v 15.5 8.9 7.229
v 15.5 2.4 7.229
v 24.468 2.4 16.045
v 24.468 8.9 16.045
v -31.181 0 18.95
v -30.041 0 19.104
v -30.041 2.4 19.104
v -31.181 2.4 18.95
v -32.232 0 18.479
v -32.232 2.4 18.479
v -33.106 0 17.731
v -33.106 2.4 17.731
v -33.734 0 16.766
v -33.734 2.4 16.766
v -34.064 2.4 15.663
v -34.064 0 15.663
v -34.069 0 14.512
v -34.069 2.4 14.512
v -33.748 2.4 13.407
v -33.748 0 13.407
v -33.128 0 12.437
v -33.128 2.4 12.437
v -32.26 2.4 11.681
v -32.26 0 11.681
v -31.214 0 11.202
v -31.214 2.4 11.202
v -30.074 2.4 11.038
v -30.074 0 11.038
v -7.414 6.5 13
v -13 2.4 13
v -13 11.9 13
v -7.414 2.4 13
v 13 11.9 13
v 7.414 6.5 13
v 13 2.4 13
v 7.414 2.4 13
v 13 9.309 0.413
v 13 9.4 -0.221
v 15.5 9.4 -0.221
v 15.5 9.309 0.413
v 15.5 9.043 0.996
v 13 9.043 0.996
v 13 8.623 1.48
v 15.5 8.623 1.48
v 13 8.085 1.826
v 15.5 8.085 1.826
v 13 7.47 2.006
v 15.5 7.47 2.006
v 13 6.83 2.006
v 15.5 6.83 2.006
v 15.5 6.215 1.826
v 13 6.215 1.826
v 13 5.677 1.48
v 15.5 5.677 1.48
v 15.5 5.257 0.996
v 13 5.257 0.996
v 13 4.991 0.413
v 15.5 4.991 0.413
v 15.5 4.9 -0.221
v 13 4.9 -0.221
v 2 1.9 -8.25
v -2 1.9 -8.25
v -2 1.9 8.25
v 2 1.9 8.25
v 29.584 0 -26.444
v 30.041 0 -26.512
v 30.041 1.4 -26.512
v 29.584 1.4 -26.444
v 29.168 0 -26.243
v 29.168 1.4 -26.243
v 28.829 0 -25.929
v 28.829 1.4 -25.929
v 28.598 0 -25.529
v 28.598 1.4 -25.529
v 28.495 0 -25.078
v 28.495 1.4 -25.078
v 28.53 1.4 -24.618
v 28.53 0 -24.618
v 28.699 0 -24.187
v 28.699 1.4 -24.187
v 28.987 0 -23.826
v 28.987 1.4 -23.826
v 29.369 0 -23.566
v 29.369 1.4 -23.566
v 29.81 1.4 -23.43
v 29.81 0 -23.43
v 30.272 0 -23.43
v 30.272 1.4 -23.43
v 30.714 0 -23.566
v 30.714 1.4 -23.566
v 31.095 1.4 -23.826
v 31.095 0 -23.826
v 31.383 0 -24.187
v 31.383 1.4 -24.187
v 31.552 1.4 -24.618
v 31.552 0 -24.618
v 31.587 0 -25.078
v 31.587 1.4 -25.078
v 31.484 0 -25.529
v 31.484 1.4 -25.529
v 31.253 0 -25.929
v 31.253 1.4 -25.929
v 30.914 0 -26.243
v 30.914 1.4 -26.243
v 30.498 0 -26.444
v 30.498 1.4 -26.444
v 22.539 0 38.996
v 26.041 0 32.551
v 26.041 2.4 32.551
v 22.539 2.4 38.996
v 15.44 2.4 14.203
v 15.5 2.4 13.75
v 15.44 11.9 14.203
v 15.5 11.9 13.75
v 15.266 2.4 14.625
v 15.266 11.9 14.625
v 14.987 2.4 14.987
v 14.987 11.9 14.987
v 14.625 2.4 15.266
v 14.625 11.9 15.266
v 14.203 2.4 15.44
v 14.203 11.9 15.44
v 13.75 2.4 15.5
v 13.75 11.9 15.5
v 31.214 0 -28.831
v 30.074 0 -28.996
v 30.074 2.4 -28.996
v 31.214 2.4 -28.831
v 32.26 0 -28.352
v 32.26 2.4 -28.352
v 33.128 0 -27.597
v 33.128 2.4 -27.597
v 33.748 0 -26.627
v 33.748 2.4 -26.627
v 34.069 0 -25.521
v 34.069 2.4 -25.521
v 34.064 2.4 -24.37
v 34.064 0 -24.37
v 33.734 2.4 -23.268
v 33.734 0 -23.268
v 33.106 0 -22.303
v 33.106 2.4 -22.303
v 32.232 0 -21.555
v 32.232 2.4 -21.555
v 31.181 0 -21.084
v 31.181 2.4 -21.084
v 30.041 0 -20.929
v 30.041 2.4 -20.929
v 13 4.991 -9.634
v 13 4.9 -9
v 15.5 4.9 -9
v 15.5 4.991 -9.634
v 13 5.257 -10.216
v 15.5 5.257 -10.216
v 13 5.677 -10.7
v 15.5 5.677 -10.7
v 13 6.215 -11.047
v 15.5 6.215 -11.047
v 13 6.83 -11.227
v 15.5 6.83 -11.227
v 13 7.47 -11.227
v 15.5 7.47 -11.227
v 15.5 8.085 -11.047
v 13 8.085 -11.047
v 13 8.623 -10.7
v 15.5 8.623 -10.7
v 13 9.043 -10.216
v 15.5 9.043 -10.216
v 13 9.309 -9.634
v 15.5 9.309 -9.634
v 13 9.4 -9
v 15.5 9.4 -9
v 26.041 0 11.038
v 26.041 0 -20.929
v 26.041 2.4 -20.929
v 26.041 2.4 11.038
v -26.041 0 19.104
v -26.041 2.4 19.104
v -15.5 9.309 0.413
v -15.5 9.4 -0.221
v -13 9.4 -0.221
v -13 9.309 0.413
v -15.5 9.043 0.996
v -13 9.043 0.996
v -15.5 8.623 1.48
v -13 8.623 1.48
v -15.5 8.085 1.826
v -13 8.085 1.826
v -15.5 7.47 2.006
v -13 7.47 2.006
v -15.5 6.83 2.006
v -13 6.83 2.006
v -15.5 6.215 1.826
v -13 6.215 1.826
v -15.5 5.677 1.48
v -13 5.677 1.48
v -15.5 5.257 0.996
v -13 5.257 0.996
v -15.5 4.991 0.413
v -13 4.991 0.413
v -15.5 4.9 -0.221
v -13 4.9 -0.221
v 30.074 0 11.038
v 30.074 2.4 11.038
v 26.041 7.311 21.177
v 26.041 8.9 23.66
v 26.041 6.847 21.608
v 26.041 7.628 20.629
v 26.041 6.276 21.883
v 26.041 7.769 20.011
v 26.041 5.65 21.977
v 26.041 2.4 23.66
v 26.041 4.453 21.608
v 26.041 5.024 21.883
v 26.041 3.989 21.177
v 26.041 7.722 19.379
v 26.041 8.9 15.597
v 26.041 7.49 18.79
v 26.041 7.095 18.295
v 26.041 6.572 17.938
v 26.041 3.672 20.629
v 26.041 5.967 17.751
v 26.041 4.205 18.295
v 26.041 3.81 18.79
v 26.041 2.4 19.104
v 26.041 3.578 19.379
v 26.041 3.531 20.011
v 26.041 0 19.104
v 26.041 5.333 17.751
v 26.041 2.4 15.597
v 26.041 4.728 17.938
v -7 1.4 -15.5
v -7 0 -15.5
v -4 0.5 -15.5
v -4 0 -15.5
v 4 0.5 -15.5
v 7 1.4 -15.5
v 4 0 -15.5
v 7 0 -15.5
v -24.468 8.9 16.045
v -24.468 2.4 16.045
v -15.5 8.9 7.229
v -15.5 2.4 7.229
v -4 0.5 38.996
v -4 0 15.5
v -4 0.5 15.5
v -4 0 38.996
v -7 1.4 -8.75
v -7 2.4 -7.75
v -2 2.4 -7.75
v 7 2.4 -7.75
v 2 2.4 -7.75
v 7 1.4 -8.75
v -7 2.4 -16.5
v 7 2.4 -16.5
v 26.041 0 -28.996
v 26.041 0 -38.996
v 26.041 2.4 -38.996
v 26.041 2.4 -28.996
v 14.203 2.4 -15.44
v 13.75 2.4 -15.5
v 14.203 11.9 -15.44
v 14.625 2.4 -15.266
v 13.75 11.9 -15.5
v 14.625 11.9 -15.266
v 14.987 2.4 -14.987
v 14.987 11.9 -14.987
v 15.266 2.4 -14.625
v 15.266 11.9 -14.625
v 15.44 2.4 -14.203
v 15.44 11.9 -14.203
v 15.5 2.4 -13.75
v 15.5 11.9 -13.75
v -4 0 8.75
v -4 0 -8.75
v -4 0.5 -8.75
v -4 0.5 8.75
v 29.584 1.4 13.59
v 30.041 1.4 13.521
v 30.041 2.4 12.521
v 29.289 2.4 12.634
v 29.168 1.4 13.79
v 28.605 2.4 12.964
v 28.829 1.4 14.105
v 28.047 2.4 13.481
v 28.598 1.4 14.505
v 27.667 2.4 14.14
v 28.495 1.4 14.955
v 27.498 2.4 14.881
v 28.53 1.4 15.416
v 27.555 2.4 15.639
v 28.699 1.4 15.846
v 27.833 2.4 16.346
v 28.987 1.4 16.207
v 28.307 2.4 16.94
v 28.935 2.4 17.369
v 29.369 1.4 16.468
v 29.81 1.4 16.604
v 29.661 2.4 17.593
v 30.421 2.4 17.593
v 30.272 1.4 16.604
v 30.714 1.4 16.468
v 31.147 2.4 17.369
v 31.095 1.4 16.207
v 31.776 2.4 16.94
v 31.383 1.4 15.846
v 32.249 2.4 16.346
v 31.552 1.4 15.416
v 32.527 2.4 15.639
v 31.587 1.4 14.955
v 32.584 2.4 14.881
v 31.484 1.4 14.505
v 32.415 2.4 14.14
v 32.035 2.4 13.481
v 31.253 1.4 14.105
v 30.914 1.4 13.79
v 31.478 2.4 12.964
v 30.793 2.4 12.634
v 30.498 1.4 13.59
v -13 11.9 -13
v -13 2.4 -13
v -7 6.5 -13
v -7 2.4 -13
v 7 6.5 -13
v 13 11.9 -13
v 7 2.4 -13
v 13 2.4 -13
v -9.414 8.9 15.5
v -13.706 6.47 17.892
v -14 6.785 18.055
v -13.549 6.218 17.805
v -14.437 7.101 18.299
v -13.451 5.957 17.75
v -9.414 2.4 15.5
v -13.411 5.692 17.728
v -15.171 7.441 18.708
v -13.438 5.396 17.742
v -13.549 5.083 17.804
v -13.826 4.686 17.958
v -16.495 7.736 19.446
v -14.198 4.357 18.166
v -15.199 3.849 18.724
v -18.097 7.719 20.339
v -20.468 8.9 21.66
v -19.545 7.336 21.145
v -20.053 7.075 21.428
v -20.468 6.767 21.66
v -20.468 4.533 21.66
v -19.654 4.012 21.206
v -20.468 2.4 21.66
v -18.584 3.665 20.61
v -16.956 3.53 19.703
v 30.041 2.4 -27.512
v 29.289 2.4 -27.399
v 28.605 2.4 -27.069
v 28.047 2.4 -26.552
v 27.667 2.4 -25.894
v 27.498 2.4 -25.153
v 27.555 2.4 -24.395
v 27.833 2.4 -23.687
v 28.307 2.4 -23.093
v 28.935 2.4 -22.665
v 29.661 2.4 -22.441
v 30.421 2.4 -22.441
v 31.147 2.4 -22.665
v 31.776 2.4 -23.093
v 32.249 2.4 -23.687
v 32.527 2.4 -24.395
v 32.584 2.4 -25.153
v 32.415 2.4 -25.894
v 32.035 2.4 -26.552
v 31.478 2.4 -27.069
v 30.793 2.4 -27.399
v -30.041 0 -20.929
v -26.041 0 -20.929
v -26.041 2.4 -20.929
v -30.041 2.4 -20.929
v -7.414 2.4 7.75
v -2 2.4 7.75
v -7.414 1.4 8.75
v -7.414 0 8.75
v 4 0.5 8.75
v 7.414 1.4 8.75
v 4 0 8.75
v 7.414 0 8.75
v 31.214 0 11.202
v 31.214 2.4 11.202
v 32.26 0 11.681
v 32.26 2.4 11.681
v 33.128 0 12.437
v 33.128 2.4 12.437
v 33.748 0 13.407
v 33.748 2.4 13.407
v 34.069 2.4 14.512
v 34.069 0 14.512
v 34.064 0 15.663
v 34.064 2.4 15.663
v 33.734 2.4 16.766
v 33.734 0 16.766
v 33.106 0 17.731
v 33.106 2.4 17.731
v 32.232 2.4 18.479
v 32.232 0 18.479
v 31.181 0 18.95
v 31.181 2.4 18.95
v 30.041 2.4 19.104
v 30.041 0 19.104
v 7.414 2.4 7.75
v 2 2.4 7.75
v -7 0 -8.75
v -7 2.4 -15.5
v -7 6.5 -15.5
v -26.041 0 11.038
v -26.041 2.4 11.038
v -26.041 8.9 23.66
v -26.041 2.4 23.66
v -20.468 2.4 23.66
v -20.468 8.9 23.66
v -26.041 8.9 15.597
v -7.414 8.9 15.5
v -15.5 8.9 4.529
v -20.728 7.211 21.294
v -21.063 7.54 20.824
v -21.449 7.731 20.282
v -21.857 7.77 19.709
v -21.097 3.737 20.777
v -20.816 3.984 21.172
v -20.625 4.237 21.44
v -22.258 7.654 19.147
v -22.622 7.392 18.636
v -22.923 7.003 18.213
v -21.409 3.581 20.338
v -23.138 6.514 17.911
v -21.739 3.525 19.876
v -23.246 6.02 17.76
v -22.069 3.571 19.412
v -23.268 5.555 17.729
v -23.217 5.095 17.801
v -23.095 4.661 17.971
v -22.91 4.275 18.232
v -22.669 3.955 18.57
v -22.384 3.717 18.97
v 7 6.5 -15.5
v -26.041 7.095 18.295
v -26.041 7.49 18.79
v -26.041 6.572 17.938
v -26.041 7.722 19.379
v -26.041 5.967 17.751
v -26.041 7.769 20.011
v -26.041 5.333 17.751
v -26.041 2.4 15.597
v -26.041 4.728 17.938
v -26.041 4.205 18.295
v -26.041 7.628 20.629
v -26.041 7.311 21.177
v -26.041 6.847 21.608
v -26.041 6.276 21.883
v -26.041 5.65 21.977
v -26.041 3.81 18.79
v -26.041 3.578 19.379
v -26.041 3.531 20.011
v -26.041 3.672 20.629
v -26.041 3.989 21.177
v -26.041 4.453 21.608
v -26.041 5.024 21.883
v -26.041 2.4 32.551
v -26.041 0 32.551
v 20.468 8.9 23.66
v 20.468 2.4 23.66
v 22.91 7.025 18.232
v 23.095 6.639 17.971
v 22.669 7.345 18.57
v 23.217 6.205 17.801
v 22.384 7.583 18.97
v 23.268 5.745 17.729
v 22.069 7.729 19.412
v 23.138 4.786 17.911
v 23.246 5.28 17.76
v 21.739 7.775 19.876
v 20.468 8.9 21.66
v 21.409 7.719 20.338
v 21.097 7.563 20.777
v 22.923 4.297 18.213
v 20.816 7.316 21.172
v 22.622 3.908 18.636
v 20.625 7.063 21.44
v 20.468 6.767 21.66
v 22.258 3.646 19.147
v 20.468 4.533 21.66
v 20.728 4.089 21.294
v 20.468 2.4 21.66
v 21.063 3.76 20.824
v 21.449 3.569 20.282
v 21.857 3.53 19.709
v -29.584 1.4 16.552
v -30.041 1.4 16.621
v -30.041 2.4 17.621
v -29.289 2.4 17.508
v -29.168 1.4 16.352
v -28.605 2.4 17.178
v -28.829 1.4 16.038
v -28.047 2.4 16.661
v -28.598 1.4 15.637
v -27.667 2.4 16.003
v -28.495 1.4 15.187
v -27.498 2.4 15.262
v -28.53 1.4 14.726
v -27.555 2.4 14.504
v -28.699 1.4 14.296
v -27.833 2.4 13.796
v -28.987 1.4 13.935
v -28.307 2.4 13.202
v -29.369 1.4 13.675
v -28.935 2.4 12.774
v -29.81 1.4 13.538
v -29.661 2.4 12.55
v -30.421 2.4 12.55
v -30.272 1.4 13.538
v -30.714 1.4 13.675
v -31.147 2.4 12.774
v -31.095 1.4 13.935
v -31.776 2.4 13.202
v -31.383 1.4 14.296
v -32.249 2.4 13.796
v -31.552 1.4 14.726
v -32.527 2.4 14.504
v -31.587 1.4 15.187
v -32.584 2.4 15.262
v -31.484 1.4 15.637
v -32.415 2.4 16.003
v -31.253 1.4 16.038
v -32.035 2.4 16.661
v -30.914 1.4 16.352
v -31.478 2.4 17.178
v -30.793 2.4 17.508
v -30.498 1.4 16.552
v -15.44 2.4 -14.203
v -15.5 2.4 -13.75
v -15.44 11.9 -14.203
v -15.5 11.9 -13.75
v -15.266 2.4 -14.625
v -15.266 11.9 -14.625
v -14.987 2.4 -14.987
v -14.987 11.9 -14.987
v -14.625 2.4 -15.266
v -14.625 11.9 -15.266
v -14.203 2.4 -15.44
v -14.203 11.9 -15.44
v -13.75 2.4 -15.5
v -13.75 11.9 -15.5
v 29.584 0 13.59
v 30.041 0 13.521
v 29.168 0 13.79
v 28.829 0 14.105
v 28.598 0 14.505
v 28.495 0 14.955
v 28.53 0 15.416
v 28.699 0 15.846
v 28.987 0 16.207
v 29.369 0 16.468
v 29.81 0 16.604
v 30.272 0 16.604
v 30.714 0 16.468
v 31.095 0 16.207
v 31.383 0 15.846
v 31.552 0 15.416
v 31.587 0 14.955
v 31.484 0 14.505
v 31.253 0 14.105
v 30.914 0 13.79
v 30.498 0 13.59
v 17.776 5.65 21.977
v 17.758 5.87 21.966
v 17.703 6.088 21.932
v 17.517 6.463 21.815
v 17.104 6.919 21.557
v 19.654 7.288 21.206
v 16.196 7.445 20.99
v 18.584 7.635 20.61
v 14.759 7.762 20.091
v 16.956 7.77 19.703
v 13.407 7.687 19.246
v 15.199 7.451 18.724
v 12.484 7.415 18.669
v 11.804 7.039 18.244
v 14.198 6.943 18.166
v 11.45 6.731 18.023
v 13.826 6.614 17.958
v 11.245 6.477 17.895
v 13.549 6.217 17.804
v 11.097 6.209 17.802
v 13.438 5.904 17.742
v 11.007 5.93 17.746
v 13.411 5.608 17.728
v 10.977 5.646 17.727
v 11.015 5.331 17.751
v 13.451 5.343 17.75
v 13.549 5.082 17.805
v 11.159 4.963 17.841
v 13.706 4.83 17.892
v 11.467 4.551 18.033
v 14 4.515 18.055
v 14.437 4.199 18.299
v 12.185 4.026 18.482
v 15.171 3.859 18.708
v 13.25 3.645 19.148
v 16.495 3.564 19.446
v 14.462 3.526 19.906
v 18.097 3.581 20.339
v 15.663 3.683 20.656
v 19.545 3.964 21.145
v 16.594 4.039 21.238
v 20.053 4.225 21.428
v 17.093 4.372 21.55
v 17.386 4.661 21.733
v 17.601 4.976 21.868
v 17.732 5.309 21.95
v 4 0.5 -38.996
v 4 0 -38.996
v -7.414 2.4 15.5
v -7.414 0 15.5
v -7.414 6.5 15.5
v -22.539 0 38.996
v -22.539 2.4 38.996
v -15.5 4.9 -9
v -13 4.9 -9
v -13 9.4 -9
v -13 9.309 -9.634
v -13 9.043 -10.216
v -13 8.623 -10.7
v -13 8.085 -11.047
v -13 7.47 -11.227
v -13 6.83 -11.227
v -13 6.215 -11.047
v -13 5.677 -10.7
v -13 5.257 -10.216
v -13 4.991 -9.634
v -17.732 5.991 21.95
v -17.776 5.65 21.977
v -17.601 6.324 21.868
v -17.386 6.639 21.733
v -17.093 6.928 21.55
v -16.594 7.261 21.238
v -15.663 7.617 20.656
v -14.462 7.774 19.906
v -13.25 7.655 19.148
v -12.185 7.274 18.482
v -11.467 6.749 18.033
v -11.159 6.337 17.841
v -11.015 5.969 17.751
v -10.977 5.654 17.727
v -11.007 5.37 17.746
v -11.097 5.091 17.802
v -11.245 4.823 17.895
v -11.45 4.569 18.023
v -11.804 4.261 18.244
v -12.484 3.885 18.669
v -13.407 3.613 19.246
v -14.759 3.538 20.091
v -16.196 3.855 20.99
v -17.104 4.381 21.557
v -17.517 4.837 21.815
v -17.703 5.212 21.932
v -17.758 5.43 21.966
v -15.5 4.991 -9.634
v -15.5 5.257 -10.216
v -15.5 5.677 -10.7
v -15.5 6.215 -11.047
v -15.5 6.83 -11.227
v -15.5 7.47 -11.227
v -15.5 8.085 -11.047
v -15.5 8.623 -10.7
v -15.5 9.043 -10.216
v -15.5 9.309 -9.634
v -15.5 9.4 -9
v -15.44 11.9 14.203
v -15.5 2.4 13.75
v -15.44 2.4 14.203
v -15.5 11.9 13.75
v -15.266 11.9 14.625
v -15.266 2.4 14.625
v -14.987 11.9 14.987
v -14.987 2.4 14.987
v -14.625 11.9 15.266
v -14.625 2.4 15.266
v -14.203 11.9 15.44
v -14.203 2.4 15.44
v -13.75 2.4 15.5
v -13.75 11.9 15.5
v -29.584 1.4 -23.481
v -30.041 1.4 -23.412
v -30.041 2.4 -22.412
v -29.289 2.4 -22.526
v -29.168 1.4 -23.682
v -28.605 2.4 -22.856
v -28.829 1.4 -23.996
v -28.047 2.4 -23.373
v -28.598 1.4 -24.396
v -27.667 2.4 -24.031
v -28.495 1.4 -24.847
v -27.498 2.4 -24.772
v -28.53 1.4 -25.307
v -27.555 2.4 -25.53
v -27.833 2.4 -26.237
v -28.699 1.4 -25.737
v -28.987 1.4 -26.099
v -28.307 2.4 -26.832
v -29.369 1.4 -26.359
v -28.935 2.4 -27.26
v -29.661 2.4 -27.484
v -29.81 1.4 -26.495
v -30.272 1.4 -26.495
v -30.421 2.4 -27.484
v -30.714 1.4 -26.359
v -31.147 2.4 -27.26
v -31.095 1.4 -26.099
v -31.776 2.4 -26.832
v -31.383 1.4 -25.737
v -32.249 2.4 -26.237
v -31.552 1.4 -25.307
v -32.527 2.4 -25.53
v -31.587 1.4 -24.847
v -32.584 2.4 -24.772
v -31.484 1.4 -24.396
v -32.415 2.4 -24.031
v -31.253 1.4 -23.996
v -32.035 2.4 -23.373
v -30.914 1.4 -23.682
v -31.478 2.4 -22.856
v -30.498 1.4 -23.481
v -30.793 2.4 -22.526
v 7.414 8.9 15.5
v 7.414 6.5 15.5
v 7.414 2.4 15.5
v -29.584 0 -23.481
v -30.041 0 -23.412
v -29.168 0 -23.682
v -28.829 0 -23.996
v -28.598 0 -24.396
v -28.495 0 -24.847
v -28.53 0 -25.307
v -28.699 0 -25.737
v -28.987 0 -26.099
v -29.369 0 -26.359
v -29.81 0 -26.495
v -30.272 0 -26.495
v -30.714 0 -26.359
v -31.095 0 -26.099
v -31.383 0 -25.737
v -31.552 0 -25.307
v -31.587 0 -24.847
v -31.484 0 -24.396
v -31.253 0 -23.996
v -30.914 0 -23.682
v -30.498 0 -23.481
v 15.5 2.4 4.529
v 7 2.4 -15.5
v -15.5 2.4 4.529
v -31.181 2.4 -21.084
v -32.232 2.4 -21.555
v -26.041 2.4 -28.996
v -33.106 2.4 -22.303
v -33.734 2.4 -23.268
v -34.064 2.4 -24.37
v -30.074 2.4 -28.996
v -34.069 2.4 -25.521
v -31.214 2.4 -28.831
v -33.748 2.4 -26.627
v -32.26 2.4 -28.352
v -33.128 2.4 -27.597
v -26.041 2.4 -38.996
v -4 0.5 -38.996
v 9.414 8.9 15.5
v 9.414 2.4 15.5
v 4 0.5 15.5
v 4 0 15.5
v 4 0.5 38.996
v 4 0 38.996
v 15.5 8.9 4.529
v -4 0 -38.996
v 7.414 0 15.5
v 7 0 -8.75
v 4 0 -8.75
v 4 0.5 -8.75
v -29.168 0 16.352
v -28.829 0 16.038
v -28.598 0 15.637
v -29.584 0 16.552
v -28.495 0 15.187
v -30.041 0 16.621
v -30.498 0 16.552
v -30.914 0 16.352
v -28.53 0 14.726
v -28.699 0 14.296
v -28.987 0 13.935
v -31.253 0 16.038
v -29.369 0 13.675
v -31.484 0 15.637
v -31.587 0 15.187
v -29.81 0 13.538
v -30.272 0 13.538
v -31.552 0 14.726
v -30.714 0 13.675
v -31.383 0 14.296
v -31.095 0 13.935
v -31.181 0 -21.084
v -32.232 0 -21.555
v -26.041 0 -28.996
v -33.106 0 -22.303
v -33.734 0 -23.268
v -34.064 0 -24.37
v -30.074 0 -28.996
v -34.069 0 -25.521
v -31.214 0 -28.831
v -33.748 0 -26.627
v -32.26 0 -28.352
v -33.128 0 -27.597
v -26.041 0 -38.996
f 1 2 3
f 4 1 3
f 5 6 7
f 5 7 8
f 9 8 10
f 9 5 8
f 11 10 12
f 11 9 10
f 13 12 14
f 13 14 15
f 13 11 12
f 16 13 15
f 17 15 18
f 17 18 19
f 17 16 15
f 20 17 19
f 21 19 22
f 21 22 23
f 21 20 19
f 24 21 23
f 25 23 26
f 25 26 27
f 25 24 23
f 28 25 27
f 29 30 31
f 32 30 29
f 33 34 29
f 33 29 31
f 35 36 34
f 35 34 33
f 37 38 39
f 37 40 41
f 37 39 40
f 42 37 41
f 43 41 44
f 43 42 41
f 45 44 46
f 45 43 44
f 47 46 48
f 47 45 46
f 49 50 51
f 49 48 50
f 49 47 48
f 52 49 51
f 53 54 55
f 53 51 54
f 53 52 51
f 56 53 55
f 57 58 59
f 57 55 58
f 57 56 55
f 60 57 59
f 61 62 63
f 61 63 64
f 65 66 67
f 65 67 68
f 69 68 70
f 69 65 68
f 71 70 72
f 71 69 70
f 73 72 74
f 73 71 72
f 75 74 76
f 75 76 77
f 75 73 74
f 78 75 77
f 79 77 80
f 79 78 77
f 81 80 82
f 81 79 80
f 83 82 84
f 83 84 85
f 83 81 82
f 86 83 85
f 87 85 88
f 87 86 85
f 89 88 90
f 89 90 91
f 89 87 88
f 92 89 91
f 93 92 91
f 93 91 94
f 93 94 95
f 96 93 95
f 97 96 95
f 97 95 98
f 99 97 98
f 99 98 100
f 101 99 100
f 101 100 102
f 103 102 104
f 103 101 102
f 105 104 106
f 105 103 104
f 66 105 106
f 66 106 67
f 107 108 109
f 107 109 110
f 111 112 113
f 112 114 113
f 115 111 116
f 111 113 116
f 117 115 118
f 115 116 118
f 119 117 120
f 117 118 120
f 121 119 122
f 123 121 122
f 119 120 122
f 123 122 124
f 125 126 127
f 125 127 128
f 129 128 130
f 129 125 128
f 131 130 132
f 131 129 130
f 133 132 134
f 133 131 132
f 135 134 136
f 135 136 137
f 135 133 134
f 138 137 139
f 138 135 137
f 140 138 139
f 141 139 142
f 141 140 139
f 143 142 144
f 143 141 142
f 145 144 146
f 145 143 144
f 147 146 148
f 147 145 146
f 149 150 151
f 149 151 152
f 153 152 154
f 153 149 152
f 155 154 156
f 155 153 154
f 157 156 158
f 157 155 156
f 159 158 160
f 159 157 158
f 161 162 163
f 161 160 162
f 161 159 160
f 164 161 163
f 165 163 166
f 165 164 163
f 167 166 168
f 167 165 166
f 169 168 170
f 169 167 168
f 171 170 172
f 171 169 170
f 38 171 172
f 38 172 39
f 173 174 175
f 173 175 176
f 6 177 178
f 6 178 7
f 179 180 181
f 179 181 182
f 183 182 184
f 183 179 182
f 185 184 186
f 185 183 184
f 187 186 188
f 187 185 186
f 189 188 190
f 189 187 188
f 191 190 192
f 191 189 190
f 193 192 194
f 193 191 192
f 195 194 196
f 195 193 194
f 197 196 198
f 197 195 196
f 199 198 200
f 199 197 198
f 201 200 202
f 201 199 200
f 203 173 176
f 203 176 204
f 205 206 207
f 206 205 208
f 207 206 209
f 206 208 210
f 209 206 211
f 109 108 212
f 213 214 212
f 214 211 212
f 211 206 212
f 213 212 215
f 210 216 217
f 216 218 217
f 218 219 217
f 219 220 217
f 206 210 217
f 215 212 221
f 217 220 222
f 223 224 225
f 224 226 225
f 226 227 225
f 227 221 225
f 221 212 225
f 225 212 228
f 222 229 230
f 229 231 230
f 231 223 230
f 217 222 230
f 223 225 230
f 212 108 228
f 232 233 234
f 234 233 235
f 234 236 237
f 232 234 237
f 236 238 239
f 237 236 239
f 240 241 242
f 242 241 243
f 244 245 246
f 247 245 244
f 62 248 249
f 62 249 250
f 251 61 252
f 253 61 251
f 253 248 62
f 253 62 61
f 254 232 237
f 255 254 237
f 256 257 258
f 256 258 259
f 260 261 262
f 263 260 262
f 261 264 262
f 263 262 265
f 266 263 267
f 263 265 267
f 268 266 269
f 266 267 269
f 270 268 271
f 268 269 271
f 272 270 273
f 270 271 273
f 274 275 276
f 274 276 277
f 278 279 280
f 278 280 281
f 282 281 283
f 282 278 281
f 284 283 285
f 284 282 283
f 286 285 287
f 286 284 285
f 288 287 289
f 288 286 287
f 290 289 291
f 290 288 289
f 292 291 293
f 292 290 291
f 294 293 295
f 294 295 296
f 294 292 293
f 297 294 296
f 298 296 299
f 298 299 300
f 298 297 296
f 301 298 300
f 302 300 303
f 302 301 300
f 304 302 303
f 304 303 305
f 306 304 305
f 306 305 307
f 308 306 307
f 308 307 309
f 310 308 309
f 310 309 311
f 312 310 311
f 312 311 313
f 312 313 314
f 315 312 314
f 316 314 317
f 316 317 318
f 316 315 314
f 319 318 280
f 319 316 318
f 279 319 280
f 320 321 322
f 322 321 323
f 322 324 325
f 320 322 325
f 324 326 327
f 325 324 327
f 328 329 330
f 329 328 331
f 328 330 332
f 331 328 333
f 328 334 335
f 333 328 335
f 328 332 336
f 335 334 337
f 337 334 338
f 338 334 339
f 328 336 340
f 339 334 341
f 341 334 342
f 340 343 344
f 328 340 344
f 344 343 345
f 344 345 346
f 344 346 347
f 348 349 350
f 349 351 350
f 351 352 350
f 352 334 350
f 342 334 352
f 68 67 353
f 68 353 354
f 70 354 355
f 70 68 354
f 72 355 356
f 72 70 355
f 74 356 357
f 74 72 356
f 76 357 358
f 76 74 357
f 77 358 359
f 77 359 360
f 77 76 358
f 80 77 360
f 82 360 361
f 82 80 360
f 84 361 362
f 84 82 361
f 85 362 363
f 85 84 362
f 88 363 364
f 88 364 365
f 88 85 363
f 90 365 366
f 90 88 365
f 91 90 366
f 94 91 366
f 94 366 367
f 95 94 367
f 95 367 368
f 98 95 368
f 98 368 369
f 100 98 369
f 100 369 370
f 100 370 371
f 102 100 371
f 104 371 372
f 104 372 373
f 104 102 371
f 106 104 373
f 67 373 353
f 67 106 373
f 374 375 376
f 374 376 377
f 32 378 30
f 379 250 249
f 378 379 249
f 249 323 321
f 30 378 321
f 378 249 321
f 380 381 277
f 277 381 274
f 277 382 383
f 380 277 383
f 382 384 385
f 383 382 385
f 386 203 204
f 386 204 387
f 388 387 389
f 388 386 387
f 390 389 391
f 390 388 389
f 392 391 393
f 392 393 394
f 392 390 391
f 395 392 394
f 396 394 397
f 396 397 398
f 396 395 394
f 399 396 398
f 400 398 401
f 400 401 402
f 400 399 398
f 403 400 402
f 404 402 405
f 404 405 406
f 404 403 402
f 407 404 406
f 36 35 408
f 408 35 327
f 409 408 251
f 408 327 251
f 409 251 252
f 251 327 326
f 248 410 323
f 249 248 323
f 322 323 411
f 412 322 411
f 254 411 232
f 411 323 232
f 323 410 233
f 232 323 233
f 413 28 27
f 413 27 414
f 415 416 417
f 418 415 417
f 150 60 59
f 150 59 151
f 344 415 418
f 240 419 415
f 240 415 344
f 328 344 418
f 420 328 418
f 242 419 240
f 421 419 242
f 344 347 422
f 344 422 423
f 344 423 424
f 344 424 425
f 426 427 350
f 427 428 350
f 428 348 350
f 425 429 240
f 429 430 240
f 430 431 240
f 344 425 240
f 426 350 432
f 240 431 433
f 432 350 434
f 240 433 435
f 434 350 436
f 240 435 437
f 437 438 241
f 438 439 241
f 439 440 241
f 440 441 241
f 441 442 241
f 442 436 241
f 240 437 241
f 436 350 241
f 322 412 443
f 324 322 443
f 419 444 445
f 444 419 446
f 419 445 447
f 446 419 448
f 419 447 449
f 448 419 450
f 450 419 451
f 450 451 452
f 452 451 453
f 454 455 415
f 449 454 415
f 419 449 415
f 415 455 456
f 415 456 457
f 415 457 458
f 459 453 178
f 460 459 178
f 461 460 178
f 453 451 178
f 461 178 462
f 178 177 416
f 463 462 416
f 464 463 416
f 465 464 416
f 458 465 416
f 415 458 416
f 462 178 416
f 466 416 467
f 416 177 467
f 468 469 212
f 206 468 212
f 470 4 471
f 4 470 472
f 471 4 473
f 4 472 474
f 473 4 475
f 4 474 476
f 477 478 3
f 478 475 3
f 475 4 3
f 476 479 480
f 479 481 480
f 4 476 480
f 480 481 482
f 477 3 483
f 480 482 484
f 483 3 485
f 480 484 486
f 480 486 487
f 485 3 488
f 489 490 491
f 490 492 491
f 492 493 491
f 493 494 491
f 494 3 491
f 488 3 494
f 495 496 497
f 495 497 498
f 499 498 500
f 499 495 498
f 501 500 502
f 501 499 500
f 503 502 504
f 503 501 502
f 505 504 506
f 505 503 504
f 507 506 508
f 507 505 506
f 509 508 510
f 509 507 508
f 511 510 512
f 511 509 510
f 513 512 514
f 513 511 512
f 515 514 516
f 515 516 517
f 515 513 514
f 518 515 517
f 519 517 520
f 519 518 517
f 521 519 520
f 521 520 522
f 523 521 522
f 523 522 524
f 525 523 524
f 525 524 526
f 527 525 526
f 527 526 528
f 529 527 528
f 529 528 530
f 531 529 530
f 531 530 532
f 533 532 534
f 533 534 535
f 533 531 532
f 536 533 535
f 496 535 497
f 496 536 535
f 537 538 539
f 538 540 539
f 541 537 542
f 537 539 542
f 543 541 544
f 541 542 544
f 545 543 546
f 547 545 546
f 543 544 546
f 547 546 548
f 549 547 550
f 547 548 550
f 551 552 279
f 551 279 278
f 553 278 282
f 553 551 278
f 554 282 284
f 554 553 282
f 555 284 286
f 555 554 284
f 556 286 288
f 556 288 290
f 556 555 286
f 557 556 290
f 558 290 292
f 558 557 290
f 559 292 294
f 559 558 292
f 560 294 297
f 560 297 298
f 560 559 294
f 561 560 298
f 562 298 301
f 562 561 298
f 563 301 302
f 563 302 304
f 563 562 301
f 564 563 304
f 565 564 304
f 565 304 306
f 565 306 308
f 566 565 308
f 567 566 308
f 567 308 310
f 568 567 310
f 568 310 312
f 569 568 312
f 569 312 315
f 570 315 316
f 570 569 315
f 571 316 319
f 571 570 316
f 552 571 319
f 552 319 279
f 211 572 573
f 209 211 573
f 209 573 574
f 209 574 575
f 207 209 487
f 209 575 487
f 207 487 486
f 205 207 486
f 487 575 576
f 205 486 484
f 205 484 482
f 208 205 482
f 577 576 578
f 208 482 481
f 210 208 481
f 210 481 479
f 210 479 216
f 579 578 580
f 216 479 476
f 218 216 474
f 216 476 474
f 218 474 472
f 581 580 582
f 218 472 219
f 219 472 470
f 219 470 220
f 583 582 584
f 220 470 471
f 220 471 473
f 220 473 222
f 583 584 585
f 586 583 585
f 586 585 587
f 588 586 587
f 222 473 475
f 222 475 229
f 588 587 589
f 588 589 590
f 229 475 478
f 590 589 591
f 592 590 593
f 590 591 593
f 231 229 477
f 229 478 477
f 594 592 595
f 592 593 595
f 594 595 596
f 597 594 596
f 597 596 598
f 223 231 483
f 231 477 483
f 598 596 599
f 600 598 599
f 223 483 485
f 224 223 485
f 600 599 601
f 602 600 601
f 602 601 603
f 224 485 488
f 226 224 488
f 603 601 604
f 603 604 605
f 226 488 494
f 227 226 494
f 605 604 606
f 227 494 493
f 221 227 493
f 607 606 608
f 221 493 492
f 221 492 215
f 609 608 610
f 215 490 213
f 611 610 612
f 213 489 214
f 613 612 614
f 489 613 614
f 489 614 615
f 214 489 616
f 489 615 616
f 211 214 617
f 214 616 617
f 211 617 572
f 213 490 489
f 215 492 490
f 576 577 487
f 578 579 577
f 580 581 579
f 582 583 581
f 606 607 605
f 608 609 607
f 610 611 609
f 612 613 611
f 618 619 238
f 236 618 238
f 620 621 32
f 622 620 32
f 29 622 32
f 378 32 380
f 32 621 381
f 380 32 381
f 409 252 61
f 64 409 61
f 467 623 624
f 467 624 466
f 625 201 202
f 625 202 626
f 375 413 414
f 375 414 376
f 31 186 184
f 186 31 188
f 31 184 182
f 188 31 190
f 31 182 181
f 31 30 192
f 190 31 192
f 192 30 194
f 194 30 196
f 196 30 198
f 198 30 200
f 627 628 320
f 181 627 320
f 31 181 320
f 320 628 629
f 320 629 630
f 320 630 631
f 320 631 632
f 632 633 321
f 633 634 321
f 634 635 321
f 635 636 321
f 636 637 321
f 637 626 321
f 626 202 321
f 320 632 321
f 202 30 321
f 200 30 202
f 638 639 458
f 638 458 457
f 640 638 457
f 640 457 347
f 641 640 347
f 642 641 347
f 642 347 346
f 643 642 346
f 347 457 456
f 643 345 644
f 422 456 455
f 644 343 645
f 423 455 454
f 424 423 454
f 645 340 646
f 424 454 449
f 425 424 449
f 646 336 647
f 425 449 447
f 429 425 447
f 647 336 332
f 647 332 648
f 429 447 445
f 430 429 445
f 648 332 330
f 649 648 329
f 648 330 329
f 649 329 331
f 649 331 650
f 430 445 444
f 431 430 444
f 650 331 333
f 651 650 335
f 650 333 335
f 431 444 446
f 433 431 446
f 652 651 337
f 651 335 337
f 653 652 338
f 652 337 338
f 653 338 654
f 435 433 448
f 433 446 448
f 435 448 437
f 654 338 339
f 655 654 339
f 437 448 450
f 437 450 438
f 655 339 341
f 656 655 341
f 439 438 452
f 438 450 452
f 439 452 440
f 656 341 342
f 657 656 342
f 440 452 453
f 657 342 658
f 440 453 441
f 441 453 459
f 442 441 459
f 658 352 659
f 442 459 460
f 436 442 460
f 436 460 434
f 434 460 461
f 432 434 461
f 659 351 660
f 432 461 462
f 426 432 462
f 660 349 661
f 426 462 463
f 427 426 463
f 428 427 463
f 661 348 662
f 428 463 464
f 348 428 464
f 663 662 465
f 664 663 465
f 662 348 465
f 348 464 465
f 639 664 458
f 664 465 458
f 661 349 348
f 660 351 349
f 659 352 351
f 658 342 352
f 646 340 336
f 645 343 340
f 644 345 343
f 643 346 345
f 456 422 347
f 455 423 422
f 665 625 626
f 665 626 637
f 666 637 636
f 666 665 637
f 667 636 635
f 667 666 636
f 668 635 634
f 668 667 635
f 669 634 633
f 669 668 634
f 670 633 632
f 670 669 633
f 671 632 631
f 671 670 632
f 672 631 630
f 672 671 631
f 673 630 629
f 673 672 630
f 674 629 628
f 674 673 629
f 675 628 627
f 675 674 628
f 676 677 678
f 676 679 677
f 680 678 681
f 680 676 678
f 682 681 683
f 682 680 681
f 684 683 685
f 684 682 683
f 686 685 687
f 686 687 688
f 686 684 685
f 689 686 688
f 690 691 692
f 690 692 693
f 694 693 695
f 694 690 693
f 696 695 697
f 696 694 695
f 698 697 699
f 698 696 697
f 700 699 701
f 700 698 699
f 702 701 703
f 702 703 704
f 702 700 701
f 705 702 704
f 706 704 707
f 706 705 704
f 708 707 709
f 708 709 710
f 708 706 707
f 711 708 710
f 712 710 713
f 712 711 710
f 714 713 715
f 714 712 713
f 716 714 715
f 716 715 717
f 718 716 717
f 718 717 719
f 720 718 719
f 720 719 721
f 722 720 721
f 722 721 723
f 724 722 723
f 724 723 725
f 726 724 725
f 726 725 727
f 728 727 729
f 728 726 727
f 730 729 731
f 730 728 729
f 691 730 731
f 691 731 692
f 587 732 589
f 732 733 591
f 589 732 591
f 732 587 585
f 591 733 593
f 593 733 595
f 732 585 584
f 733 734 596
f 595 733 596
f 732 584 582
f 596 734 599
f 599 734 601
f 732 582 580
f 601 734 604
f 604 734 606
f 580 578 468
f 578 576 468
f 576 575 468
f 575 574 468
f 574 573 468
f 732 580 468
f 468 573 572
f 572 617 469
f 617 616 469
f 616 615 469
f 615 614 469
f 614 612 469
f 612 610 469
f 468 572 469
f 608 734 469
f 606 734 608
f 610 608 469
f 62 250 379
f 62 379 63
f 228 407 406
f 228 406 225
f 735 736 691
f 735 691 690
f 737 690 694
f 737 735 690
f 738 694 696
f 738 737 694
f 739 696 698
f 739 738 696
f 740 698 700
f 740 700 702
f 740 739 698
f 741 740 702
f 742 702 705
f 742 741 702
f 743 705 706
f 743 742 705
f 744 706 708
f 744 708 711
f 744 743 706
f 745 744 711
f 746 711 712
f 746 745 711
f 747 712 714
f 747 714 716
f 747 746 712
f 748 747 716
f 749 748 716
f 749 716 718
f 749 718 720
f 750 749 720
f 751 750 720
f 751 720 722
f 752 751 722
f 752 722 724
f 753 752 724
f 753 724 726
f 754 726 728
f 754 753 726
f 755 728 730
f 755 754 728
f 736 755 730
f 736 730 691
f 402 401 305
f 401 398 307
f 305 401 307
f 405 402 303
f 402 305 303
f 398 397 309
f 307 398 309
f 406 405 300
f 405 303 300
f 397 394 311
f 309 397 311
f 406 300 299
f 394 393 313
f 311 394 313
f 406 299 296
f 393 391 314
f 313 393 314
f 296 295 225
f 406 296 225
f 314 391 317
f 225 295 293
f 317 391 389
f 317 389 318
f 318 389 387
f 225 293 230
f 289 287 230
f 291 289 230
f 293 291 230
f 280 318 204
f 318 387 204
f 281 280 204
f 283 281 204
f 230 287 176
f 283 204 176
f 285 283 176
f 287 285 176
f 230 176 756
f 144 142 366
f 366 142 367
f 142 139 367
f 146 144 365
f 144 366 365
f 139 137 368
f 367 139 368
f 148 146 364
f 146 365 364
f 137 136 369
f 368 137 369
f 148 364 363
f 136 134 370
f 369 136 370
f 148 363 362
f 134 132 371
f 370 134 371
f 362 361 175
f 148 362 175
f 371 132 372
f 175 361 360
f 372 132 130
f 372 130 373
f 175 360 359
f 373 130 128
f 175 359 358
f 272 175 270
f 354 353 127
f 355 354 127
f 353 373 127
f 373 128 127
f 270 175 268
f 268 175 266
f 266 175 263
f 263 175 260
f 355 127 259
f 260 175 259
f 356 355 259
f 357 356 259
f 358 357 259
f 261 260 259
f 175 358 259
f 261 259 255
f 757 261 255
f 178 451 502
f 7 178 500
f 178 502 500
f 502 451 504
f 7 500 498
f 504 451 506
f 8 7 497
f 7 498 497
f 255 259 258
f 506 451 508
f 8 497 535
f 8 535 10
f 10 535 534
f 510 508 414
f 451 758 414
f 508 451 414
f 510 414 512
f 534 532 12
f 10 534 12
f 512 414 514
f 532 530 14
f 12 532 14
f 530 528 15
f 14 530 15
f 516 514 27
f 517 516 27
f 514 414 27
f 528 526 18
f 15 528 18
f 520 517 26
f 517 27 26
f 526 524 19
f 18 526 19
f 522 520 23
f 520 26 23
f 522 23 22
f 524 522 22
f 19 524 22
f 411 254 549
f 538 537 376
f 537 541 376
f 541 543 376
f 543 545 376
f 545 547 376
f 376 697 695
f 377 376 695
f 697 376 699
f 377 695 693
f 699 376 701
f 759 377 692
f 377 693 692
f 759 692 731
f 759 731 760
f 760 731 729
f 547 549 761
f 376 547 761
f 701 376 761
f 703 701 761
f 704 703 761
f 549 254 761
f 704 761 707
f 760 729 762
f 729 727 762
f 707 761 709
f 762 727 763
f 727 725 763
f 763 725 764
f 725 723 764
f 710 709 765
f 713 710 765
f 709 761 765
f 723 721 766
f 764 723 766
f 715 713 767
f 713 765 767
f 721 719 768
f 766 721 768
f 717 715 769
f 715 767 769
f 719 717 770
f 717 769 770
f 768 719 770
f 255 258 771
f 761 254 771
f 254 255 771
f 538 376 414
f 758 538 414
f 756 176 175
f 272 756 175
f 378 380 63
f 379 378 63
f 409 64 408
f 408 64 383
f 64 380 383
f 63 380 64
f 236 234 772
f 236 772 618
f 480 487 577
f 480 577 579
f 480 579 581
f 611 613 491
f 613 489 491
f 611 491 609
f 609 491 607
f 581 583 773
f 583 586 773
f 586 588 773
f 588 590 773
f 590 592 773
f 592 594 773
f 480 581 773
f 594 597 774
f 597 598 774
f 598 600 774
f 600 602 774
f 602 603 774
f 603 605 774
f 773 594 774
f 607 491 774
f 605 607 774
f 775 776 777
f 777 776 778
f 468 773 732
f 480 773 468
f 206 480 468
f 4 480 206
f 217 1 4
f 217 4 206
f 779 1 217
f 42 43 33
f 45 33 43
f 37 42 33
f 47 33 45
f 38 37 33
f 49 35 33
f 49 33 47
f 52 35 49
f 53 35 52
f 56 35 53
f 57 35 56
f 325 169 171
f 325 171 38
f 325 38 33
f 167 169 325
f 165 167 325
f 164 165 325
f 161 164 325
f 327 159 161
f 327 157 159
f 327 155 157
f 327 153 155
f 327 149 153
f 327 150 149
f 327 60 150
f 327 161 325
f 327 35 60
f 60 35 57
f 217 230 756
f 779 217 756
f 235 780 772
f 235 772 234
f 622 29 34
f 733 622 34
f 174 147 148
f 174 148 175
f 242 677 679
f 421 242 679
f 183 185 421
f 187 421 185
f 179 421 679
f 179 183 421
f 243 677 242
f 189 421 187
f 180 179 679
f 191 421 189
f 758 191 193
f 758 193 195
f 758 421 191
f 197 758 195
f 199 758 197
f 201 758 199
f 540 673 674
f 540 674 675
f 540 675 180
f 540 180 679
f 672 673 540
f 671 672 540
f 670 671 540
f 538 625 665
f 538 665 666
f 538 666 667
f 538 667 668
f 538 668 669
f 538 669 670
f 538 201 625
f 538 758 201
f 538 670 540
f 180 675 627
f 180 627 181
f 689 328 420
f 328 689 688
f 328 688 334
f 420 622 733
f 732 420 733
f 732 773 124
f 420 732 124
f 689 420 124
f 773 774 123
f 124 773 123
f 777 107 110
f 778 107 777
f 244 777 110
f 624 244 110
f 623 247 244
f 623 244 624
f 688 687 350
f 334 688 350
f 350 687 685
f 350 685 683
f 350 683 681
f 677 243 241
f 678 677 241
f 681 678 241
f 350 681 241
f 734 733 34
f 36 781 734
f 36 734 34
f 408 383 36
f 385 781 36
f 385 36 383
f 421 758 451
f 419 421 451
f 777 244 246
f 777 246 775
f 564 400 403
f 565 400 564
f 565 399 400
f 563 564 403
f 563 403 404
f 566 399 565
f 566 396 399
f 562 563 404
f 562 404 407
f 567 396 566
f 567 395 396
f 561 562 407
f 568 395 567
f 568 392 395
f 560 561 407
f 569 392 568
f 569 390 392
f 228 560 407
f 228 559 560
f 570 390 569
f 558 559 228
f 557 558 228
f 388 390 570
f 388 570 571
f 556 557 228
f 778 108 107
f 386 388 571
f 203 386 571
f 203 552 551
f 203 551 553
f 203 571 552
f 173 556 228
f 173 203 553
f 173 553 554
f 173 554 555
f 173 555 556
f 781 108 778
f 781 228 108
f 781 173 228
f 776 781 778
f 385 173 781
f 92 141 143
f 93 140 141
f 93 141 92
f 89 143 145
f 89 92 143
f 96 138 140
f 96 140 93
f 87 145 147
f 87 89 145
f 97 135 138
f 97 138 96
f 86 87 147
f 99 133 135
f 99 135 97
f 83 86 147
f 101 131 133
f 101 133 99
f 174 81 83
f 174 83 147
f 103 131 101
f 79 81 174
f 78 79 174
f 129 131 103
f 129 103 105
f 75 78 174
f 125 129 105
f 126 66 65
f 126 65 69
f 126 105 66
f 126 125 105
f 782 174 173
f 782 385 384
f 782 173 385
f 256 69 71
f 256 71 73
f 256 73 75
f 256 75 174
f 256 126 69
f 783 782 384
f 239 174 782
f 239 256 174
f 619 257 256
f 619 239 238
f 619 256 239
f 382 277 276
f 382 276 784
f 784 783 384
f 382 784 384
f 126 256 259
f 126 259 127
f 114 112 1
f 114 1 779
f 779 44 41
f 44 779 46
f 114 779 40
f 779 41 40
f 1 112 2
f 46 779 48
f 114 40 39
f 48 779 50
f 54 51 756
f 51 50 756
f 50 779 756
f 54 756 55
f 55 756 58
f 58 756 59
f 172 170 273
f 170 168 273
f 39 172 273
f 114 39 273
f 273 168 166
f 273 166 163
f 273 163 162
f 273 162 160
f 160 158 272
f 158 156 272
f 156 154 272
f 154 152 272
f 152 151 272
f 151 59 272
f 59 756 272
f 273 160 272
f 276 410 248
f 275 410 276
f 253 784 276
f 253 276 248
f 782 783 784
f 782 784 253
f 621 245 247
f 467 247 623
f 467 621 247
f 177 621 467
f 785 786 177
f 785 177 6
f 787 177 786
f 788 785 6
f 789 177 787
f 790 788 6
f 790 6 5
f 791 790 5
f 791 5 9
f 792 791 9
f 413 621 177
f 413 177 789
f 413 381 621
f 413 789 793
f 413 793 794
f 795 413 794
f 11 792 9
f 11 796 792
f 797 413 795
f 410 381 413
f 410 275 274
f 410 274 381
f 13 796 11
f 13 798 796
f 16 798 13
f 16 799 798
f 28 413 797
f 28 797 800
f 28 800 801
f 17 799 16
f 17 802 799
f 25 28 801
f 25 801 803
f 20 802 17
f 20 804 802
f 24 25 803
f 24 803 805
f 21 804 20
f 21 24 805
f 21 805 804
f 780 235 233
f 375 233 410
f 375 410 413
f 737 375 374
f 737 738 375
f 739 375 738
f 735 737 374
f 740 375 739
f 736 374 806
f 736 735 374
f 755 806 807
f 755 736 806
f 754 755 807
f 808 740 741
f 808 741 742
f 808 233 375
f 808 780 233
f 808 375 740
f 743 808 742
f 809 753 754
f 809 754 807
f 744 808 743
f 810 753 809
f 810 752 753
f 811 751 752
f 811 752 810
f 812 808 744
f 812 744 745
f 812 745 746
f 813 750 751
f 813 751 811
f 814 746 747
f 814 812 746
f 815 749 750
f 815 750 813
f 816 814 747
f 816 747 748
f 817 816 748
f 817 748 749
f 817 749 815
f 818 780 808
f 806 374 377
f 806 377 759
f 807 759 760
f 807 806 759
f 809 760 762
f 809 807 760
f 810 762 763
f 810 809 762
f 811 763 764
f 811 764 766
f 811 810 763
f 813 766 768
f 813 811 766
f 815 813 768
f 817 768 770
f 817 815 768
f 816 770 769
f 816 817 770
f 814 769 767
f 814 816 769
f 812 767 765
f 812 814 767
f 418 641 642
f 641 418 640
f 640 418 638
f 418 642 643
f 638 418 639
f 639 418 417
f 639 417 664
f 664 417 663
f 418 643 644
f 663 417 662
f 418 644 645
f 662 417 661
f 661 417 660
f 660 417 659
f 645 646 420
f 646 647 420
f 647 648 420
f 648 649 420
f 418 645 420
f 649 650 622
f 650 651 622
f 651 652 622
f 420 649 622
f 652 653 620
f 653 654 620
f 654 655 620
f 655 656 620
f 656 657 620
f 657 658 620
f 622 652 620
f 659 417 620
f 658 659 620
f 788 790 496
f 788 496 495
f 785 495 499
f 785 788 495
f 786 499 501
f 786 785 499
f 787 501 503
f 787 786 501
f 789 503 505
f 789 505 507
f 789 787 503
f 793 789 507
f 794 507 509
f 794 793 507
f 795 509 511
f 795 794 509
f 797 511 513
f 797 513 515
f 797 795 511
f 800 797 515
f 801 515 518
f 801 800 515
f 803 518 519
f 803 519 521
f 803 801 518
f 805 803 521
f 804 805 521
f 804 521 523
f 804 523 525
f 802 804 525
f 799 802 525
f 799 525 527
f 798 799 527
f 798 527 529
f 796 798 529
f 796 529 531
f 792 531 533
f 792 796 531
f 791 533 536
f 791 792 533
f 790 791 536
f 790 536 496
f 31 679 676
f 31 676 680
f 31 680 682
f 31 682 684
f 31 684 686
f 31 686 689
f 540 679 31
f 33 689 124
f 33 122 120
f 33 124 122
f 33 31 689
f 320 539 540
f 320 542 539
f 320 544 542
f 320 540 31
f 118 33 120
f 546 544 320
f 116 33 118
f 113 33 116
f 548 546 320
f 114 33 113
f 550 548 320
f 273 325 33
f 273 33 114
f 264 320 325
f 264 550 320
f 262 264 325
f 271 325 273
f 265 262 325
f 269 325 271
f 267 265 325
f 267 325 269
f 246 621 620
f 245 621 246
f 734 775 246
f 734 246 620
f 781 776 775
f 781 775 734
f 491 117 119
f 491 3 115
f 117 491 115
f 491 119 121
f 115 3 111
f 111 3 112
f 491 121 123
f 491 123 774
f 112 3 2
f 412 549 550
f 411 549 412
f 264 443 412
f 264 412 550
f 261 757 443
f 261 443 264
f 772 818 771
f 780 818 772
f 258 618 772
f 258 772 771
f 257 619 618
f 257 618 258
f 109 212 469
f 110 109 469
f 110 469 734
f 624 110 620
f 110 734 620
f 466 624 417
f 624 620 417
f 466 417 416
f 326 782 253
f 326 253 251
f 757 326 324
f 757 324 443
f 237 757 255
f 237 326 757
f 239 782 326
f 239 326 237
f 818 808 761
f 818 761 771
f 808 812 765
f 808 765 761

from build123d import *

# Parameters (mm, degrees)
SKETCH1_R              = 1.55
EXTRUDE_707_DEPTH      = 2.4
SKETCH2_W              = 31
SKETCH2_H              = 31
SKETCH2_W_2            = 26
SKETCH2_H_2            = 26
GPS_DEPTH              = 9.5
GPS_2_R                = 1.75
CHAMFER_1832_SIZE      = 1
EXTRUDE_3171_DEPTH     = 6.5
SKETCH4_R              = 2.125
CUT_EXTRUDE_3634_DEPTH = 73.664551053
CUT_EXTRUDE_3926_DEPTH = 65.212061635
SKETCH7_W              = 14
SKETCH7_H              = 6.75
SKETCH7_W_2            = 14.827228548
CUT_EXTRUDE_4854_DEPTH = 6.5
SKETCH8_W              = 4
SKETCH8_H              = 17.5
CUT_EXTRUDE_5206_DEPTH = 0.5
CHAMFER_5287_SIZE      = 1
SKETCH9_W              = 8
SKETCH9_H              = 77.991423638
CUT_EXTRUDE_6206_DEPTH = 0.5


with BuildPart() as part:
    # Sketch1 → Extrude 707 (new body)
    with BuildSketch(Plane(origin=(0, 0, 0), x_dir=(1, 0, 0), z_dir=(0, 1, 0))):
        with BuildLine():
            Line((-26.041067799, 38.995711819), (26.041067799, 38.995711819))
            Line((26.041067799, 38.995711819), (26.041067799, 28.995711819))
            Line((26.041067799, 28.995711819), (30.074330581, 28.995711819))
            ThreePointArc((30.074330581, 28.995711819), (34.107558501, 24.94567978), (30.040792356, 20.929325701))
            Line((30.040792356, 20.929325701), (26.041067799, 20.929325701))
            Line((26.041067799, 20.929325701), (26.041067799, -11.037902063))
            Line((26.041067799, -11.037902063), (30.074330581, -11.037902063))
            ThreePointArc((30.074330581, -11.037902063), (34.107558501, -15.087934101), (30.040792356, -19.104288181))
            Line((30.040792356, -19.104288181), (26.041067799, -19.104288181))
            Line((26.041067799, -19.104288181), (26.041067799, -32.550614881))
            Line((26.041067799, -32.550614881), (22.539090807, -38.995711819))
            Line((22.539090807, -38.995711819), (-22.539090807, -38.995711819))
            Line((-22.539090807, -38.995711819), (-26.041067799, -32.550614881))
            Line((-26.041067799, -32.550614881), (-26.041067799, -19.104288181))
            Line((-26.041067799, -19.104288181), (-30.040792356, -19.104288181))
            ThreePointArc((-30.040792356, -19.104288181), (-34.107558501, -15.087934101), (-30.074330581, -11.037902063))
            Line((-30.074330581, -11.037902063), (-26.041067799, -11.037902063))
            Line((-26.041067799, -11.037902063), (-26.041067799, 20.929325701))
            Line((-26.041067799, 20.929325701), (-30.040792356, 20.929325701))
            ThreePointArc((-30.040792356, 20.929325701), (-34.107558501, 24.94567978), (-30.074330581, 28.995711819))
            Line((-30.074330581, 28.995711819), (-26.041067799, 28.995711819))
            Line((-26.041067799, 28.995711819), (-26.041067799, 38.995711819))
        make_face()
        with Locations(Location((-30.041067799, 24.962449038, 0), (0, 0, 270))):
            Circle(SKETCH1_R, mode=Mode.SUBTRACT)
        with Locations(Location((30.041067799, 24.962449038, 0), (0, 0, 90))):
            Circle(SKETCH1_R, mode=Mode.SUBTRACT)
        with Locations(Location((-30.041067799, -15.071164844, 0), (0, 0, 270))):
            Circle(SKETCH1_R, mode=Mode.SUBTRACT)
        with Locations(Location((30.041067799, -15.071164844, 0), (0, 0, 90))):
            Circle(SKETCH1_R, mode=Mode.SUBTRACT)
    extrude(amount=EXTRUDE_707_DEPTH)

    # Sketch2 → GPS (add)
    with BuildSketch(Plane(origin=(0, 2.4, 0), x_dir=(1, 0, 0), z_dir=(0, 1, 0))):
        Rectangle(SKETCH2_W, SKETCH2_H)
        Rectangle(SKETCH2_W_2, SKETCH2_H_2, mode=Mode.SUBTRACT)
    extrude(amount=GPS_DEPTH)

    # GPS 2
    gps_2_edges = [part.edges().sort_by_distance(p)[0] for p in [
        (15.5, 7.15, -15.5),
        (-15.5, 7.15, -15.5),
        (-15.5, 7.15, 15.5),
        (15.5, 7.15, 15.5),
    ]]
    fillet(gps_2_edges, radius=GPS_2_R)

    # Chamfer 1832
    chamfer_1832_edges = [part.edges().sort_by_distance(p)[0] for p in [
        (-30.041067799, 2.4, -26.512449038),
        (30.041067799, 2.4, -23.412449038),
        (30.041067799, 2.4, 16.621164844),
        (-30.041067799, 2.4, 13.521164844),
    ]]
    chamfer(chamfer_1832_edges, length=CHAMFER_1832_SIZE)

    # Sketch3 → Extrude 3171 (add)
    with BuildSketch(Plane(origin=(0, 2.4, 0), x_dir=(1, 0, 0), z_dir=(0, 1, 0))):
        Polygon((-24.467823985, -16.04483058), (-15.5, -7.229070577), (-15.5, -4.529331749), (-26.041067799, -15.596764458), (-26.041067799, -23.659714375), (-20.467823985, -23.659714375), (-7.413614274, -15.5), (-9.413614274, -15.5), (-20.467823985, -21.659714375), align=None)
        Polygon((9.413614274, -15.5), (7.413614274, -15.5), (20.467823985, -23.659714375), (26.041067799, -23.659714375), (26.041067799, -15.596764458), (15.5, -4.529331749), (15.5, -7.229070577), (24.467823985, -16.04483058), (20.467823985, -21.659714375), align=None)
    extrude(amount=EXTRUDE_3171_DEPTH)

    # Sketch4 → Cut-Extrude 3634 (cut, through all)
    with BuildSketch(Plane.ZY.offset(26.041067799)):
        with Locations((19.852272478, 5.65)):
            Circle(SKETCH4_R)
    extrude(amount=-CUT_EXTRUDE_3634_DEPTH, mode=Mode.SUBTRACT)

    # Sketch6 → Cut-Extrude 3926 (cut, through all)
    with BuildSketch(Plane.ZY.offset(15.5)):
        with BuildLine():
            Line((-9, 9.4), (-0.220668251, 9.4))
            ThreePointArc((-0.220668251, 9.4), (2.029331749, 7.15), (-0.220668251, 4.9))
            Line((-0.220668251, 4.9), (-9, 4.9))
            ThreePointArc((-9, 4.9), (-11.25, 7.15), (-9, 9.4))
        make_face()
    extrude(amount=-CUT_EXTRUDE_3926_DEPTH, mode=Mode.SUBTRACT)

    # Sketch7 → Cut-Extrude 4854 (cut)
    with BuildSketch(Plane(origin=(0, 0, 0), x_dir=(1, 0, 0), z_dir=(0, 1, 0))):
        with Locations((0, 12.125)):
            Rectangle(SKETCH7_W, SKETCH7_H)
        with Locations((0, -12.125)):
            Rectangle(SKETCH7_W_2, SKETCH7_H)
    extrude(amount=CUT_EXTRUDE_4854_DEPTH, mode=Mode.SUBTRACT)

    # Sketch8 → Cut-Extrude 5206 (cut)
    with BuildSketch(Plane(origin=(0, 2.4, 0), x_dir=(1, 0, 0), z_dir=(0, 1, 0))):
        Rectangle(SKETCH8_W, SKETCH8_H)
    extrude(amount=-CUT_EXTRUDE_5206_DEPTH, mode=Mode.SUBTRACT)

    # Chamfer 5287
    chamfer_5287_edges = [part.edges().sort_by_distance(p)[0] for p in [
        (4.5, 2.4, -8.75),
        (0, 2.4, -15.5),
        (-4.706807137, 2.4, 8.75),
    ]]
    chamfer(chamfer_5287_edges, length=CHAMFER_5287_SIZE)

    # Sketch9 → Cut-Extrude 6206 (cut)
    with BuildSketch(Plane.XZ):
        Rectangle(SKETCH9_W, SKETCH9_H)
    extrude(amount=-CUT_EXTRUDE_6206_DEPTH, mode=Mode.SUBTRACT)


solid = part.part
